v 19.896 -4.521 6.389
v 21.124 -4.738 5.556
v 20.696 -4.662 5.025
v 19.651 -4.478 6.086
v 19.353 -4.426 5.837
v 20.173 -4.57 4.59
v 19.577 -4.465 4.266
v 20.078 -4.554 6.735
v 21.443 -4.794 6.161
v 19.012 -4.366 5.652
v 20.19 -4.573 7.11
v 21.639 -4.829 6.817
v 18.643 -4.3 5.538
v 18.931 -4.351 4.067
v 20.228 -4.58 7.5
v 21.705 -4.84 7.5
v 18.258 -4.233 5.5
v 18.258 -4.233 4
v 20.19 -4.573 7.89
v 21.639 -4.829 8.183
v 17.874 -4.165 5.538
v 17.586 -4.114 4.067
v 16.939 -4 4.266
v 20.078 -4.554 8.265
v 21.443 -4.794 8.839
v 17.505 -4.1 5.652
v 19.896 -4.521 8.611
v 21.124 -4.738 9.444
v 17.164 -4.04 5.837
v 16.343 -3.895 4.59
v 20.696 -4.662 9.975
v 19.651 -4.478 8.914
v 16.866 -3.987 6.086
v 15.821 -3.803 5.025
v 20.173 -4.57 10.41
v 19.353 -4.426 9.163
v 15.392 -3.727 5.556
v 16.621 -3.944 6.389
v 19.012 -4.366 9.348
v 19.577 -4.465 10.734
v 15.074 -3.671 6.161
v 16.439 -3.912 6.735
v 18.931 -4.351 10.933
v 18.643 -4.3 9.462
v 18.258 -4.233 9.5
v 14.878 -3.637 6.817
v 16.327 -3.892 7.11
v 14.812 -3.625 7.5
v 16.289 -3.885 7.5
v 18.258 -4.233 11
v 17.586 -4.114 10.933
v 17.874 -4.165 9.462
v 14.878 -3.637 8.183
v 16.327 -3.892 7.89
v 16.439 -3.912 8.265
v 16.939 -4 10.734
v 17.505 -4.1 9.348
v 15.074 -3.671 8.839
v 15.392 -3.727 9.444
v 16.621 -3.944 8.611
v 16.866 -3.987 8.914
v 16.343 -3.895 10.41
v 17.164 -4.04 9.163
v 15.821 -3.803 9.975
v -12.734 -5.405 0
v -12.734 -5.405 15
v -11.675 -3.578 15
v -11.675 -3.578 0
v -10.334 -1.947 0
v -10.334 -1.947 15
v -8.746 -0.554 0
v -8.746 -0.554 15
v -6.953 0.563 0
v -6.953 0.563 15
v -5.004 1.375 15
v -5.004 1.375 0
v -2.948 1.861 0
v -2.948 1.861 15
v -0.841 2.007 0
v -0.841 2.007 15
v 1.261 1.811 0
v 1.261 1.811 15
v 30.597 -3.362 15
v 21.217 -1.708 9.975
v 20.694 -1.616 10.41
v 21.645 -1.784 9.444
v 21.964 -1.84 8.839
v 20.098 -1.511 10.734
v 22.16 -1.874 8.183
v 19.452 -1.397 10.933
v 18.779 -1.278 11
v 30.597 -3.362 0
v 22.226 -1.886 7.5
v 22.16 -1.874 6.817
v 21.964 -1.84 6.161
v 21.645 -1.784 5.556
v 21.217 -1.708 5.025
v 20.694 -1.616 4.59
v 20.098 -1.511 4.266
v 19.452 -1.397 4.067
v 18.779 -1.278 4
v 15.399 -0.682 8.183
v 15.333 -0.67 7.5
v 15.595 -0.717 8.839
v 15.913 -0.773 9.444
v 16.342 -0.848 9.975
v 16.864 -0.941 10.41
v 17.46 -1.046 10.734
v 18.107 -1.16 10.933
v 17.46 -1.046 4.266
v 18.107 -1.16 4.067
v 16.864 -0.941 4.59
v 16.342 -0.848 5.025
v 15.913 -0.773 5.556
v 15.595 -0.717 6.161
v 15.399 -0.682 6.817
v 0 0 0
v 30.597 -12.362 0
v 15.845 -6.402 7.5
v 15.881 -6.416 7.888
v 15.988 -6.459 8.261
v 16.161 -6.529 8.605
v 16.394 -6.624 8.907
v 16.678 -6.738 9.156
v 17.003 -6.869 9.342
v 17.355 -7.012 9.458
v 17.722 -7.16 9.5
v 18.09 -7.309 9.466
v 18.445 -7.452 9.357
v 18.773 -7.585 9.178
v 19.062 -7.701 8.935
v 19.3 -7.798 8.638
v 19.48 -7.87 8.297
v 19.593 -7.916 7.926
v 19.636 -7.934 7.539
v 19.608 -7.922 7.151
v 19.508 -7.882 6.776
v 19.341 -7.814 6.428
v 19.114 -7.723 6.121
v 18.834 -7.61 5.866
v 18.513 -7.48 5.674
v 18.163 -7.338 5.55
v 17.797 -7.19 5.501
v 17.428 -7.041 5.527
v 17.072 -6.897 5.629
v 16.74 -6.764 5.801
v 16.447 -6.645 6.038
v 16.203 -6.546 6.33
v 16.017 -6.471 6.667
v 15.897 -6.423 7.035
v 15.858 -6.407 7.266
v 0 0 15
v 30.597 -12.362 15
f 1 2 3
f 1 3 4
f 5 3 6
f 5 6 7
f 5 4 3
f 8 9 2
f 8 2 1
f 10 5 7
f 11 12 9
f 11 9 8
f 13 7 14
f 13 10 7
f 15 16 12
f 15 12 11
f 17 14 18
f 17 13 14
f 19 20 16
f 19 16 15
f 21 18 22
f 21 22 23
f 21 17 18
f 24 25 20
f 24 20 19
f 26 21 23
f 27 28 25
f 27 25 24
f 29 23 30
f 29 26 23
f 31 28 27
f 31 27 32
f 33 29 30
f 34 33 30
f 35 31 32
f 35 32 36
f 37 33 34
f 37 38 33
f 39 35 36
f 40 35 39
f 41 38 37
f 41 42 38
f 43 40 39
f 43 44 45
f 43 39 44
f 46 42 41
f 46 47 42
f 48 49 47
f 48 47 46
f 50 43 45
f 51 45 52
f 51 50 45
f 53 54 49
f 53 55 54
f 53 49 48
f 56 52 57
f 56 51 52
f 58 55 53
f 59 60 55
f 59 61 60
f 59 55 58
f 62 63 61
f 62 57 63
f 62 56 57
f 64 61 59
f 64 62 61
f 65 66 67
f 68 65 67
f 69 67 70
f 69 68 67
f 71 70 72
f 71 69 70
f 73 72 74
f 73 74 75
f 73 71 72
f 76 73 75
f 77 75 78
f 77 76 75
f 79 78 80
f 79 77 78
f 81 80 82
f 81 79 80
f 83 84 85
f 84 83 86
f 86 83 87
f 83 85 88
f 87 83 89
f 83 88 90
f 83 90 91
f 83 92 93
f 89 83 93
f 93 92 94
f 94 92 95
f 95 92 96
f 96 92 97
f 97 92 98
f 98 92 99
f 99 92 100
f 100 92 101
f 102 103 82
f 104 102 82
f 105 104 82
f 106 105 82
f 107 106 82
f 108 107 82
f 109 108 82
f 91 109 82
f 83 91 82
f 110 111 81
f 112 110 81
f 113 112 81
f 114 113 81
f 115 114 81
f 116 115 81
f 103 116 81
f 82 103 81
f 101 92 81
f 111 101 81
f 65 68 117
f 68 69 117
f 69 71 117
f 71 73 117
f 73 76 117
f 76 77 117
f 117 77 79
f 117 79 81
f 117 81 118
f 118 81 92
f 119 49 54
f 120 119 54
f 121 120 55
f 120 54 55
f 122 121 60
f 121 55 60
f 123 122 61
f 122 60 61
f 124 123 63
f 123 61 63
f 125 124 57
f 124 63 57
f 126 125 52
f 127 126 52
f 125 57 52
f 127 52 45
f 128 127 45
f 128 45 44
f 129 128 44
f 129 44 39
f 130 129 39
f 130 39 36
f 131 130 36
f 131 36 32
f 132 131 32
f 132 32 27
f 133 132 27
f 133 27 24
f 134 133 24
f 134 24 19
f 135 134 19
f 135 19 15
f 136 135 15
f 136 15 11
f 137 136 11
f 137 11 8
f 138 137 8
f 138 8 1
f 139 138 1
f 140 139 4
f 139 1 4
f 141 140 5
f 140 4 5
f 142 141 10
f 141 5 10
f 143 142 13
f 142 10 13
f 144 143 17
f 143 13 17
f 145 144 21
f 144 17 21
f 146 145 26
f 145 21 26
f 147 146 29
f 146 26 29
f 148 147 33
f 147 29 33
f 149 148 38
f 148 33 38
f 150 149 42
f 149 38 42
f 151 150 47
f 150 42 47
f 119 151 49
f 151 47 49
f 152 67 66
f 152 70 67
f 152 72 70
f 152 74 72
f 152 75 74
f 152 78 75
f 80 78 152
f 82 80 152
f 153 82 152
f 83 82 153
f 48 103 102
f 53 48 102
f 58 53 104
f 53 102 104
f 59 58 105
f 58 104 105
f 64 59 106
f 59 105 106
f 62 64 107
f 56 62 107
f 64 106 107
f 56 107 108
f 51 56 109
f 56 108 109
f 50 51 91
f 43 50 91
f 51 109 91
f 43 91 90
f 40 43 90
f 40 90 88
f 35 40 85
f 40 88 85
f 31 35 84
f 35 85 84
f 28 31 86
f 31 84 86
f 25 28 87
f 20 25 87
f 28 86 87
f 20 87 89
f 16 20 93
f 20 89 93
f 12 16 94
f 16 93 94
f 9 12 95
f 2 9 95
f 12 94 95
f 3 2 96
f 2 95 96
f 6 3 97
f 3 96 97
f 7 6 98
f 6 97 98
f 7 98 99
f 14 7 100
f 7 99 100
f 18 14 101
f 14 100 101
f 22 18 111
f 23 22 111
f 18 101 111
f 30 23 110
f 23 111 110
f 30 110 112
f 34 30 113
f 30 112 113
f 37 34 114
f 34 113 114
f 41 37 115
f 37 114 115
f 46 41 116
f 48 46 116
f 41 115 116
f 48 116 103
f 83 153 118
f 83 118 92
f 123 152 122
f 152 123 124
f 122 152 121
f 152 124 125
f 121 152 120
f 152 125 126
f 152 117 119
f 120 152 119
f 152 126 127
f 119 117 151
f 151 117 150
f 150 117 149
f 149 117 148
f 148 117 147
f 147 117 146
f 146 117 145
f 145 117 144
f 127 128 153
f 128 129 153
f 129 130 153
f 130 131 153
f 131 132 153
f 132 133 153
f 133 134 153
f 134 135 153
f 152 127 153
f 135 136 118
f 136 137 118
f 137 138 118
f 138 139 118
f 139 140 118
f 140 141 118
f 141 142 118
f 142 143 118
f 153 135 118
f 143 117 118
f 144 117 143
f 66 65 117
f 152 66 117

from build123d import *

# Parameters (mm, degrees)
F1_DEPTH    = 15
F2_T1_DEPTH = 86.0591430992
F3_R        = 2
F4_DEPTH    = 16.3887129303
F5_R        = 3.5
F5_R_2      = 2
F6_DEPTH    = 3


# Not quite as in the source:
# - a fillet or chamfer that OpenCascade refuses, or shapes differently, is made with other operations: its cross-section is extruded or revolved along the edge and cut away or added


with BuildPart() as f1:
    # F0 (on Top) → F1 (new body)
    with BuildSketch(Plane.XY):
        Polygon((-12.7344739318, -5.4054634817), (0, 0), (30.5970672007, -12.3620175827), (30.5970672007, -3.3620175827), (-12.7344739318, 4.2785022346), align=None)
    extrude(amount=F1_DEPTH)

    # F2: fillet of radius 13 on 1 edges, made by hand

    # F2_s2 → F2_t1 (cut)
    with BuildSketch(Plane.XY.offset(-35.5295715496)):
        with BuildLine():
            ThreePointArc((-12.7344739318, -5.4054634817), (-6.9533889828, 0.5627654484), (1.2614450775, 1.8106440935))
            Line((1.2614450775, 1.8106440935), (-12.7344739318, 4.2785022346))
            Line((-12.7344739318, 4.2785022346), (-12.7344739318, -5.4054634817))
        make_face()
    extrude(amount=F2_T1_DEPTH, mode=Mode.SUBTRACT)

    # F3 (on face) → F4 (cut, through all)
    with BuildSketch(Plane(origin=(0.3476755995, 1.9717663066, 0), x_dir=(-0.984807753, 0.1736481777, 0), z_dir=(0.1736481777, 0.984807753, 0))):
        with Locations((-18.7160372252, 7.5)):
            Circle(F3_R)
    extrude(amount=-F4_DEPTH, mode=Mode.SUBTRACT)

    # F5 (on face) → F6 (cut)
    with BuildSketch(Plane(origin=(0.3476755995, 1.9717663066, 0), x_dir=(-0.984807753, 0.1736481777, 0), z_dir=(0.1736481777, 0.984807753, 0))):
        with Locations((-18.7160372252, 7.5)):
            Circle(F5_R)
        with Locations((-18.7160372252, 7.5)):
            Circle(F5_R_2, mode=Mode.SUBTRACT)
    extrude(amount=-F6_DEPTH, mode=Mode.SUBTRACT)


solid = f1.part
